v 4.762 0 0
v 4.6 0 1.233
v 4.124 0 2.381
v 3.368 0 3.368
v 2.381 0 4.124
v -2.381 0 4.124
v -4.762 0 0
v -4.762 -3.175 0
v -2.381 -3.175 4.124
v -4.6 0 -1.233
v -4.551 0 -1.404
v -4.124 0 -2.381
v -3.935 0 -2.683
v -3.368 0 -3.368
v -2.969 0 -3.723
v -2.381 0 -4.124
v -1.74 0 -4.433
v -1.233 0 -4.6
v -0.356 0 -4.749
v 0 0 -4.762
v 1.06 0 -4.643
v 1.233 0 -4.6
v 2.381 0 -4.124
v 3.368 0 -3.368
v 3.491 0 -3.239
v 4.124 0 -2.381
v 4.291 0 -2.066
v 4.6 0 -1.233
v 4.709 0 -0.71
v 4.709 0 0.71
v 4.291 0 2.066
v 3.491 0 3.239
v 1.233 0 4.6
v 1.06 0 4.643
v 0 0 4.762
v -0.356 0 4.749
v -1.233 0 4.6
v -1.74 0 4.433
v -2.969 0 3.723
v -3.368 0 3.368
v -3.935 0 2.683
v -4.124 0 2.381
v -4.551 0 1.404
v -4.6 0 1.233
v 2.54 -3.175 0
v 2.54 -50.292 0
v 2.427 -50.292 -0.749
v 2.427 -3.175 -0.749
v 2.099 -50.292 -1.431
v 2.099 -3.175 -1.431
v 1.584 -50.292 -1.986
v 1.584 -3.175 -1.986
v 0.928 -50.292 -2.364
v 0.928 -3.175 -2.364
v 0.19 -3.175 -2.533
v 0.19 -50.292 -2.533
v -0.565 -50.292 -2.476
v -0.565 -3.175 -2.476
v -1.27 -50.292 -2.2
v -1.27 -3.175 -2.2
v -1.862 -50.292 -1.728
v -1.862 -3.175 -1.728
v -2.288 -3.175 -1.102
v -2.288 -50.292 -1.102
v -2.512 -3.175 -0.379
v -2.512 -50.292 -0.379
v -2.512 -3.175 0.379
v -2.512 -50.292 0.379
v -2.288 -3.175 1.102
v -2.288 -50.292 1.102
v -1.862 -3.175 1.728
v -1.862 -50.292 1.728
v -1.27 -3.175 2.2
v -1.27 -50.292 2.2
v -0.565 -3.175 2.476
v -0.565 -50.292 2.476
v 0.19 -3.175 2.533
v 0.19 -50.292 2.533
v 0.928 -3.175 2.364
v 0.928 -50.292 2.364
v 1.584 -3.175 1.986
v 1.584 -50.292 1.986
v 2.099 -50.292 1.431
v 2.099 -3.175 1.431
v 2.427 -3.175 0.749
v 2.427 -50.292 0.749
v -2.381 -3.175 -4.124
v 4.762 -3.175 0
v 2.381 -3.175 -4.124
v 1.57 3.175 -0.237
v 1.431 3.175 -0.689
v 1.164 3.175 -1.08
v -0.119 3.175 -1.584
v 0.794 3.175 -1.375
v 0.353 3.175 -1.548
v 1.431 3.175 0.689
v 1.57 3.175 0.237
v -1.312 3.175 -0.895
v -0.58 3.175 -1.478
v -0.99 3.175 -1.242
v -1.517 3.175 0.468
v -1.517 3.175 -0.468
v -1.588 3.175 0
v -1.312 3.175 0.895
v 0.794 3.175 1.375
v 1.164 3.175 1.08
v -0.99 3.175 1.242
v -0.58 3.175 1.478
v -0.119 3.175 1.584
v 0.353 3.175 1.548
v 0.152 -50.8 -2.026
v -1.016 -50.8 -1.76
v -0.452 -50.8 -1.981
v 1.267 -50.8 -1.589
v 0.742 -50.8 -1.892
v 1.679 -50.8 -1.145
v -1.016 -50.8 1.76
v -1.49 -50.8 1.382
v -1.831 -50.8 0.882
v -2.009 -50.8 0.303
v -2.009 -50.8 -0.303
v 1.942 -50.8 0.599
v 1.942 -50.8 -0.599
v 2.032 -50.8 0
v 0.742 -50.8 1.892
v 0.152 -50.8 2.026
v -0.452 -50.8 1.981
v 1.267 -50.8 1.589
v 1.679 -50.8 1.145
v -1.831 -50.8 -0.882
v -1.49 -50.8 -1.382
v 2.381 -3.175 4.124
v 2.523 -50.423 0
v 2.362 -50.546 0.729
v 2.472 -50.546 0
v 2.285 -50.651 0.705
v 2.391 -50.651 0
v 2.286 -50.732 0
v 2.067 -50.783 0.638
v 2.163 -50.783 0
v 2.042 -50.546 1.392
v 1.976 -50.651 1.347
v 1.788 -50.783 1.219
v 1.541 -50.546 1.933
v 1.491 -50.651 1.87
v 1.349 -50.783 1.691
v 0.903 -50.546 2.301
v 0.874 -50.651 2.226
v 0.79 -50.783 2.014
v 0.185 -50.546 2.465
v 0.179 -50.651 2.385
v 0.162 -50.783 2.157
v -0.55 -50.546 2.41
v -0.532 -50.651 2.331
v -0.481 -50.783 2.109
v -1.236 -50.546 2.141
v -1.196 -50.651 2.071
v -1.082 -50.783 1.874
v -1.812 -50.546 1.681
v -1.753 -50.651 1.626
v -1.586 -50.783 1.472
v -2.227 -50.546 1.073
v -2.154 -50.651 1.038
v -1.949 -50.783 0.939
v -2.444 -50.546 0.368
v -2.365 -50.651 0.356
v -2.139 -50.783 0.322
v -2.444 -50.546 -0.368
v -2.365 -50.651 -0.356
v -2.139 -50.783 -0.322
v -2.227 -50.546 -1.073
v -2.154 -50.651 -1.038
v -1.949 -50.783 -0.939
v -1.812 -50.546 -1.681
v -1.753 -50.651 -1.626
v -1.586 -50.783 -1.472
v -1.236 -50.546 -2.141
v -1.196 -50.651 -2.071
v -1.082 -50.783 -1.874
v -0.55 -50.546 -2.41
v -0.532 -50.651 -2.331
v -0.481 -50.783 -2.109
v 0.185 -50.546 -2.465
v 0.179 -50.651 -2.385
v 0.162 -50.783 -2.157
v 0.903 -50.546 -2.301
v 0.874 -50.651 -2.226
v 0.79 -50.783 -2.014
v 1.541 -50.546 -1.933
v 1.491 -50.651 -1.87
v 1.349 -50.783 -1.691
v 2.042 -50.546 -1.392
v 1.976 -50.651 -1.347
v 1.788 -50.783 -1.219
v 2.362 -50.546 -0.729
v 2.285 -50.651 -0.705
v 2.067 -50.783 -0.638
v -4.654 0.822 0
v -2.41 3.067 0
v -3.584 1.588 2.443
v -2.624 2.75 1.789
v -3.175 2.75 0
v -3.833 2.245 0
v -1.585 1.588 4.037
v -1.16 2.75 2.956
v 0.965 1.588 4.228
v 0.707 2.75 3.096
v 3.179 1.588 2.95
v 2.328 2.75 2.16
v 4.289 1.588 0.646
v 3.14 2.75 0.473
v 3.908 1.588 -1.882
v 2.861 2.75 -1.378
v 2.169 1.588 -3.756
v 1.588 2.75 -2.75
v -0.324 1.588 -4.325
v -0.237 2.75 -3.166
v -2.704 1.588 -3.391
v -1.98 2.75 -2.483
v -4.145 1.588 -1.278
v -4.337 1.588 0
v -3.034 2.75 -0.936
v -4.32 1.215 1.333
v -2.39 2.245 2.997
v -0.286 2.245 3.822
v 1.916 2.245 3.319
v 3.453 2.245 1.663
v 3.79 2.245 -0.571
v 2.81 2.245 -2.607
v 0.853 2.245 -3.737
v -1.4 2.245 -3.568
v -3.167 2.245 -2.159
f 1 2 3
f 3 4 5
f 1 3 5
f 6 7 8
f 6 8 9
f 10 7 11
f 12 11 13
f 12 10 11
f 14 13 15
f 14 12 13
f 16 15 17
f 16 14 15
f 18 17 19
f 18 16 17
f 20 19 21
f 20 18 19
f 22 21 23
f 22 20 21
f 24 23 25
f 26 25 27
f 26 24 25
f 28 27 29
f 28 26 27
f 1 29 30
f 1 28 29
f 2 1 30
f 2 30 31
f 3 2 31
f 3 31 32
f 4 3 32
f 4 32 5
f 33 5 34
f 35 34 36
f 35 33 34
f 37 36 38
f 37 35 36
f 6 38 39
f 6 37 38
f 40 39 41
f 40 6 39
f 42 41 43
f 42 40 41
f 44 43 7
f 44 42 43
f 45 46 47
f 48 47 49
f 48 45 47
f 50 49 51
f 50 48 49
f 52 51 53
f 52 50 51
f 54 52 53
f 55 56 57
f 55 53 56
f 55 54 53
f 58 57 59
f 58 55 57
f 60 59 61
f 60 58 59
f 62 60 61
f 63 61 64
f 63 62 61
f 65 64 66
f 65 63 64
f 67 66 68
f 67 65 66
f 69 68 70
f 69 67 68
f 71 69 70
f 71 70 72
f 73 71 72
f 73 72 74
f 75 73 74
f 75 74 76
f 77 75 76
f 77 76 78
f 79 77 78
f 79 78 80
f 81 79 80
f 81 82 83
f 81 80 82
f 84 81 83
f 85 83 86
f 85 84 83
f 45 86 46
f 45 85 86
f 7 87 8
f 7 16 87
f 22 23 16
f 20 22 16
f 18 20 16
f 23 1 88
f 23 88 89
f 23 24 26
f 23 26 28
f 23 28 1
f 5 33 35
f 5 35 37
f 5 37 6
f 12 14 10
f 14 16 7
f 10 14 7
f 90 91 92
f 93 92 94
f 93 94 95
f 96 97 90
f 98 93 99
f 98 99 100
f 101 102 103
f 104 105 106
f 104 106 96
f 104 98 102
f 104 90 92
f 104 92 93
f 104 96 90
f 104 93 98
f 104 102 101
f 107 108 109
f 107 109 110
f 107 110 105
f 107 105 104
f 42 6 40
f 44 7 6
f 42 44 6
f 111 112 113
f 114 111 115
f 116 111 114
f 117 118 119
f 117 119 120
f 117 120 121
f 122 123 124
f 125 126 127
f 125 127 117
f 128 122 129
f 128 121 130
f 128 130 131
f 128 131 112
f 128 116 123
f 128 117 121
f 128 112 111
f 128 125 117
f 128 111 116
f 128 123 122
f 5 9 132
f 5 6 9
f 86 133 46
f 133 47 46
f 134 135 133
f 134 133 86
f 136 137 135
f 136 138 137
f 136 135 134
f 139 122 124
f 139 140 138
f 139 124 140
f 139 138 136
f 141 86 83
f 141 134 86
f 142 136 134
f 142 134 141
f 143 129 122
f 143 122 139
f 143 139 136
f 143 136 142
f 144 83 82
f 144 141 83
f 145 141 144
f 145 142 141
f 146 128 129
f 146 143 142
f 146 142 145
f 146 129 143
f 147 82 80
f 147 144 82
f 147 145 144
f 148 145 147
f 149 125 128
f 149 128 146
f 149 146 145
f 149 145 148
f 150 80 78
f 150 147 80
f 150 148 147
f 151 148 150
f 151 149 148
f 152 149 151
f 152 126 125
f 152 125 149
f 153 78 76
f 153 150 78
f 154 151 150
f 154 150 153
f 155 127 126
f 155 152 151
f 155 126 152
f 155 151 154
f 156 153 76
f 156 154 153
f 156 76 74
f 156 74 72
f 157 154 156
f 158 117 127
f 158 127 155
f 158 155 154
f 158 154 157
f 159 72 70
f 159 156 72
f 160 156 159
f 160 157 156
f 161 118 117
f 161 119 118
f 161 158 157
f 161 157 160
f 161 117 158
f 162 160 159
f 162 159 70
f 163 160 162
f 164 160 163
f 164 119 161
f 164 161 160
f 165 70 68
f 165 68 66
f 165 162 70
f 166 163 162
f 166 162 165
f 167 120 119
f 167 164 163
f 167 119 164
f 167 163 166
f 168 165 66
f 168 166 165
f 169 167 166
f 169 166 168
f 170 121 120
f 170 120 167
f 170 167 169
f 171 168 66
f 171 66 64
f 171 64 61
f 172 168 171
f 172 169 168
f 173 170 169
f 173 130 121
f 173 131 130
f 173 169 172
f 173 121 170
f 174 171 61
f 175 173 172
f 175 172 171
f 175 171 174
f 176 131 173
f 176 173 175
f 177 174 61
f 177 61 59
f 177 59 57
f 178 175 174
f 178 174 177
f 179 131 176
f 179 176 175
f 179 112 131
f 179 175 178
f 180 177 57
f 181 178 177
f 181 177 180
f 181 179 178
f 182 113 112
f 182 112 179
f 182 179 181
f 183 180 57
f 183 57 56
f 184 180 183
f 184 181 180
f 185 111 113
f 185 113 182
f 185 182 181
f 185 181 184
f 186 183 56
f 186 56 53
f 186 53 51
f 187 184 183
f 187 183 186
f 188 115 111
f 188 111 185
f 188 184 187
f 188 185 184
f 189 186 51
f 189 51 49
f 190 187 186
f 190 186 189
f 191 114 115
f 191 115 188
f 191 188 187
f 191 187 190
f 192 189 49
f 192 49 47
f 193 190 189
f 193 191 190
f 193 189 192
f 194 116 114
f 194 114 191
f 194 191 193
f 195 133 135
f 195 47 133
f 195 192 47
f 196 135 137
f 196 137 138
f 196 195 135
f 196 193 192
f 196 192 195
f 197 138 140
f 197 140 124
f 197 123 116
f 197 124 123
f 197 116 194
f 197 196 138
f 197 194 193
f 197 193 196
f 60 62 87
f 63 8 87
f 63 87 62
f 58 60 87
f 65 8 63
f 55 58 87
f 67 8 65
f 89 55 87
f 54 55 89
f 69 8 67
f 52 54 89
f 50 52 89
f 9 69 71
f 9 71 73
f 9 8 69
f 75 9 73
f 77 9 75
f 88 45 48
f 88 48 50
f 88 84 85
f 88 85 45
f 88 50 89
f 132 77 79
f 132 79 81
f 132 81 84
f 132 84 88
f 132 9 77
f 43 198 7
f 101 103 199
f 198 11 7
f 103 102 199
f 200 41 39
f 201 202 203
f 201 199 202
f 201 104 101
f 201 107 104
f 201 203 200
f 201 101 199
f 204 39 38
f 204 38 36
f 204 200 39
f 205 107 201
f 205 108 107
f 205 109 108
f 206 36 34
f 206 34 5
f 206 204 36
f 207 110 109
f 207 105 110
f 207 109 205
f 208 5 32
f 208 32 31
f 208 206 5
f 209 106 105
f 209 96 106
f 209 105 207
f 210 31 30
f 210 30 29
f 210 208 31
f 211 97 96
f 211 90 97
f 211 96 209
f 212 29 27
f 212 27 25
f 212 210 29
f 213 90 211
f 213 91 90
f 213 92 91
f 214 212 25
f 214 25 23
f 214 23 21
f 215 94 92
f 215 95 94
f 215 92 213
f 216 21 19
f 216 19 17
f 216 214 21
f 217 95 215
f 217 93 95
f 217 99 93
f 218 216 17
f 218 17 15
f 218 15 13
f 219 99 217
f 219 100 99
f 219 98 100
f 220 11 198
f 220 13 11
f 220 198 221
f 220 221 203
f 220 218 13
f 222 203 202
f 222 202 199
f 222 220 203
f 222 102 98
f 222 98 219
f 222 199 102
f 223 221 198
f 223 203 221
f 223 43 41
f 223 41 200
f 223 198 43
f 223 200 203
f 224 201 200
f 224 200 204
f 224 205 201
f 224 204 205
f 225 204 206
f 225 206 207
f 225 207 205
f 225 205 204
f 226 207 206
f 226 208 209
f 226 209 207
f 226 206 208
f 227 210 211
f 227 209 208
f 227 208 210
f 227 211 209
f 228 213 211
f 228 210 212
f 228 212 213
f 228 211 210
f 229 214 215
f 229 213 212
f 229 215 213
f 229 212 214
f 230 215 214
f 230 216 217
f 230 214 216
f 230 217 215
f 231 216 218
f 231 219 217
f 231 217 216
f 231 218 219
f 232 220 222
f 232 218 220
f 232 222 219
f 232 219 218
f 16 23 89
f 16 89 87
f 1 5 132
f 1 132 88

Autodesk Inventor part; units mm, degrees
ref_plane "YZ Plane" through (0, 0, 0) normal (1, 0, 0) x (0, 1, 0)
ref_plane "XZ Plane" through (0, 0, 0) normal (0, 1, 0) x (-1, 0, 0)
ref_plane "XY Plane" through (0, 0, 0) normal (0, 0, 1) x (1, 0, 0)
sketch "Sketch1" plane through (0, 0, 0) normal (0, 1, 0) x (-1, 0, 0)
  circle A0 centre (0, 0) radius 4.7625
  dimension "d0" = 9.525
extrude "Extrusion1" add sketch "Sketch1" along normal blind 3.175
fillet "Fillet1" radius 3.175 1 edges at (4.7625, 3.175, 0)
sketch "Sketch2" plane through (0, 0, 0) normal (0, -1, 0) x (1, 0, 0)
  circle A0 centre (0, 0) radius 2.54
  dimension "d4" = 5.08
extrude "Extrusion2" add sketch "Sketch2" along normal blind 50.8
fillet "Fillet2" radius 0.508 1 edges at (-2.54, -50.8, 0)
thread "Thread1" size "12-24 UNC" class "2A" standard "ANSI Unified Screw Threads" full length
sketch "Sketch3" plane through (0, 0, 0) normal (0, -1, 0) x (1, 0, 0)
  circle A0 centre (0, 0) radius 1.5875 projected
  circle A1 centre (0, 0) radius 4.7625 projected
  line L0 (-4.7625, 0) -> (-2.3813, 4.1244)
  line L1 (-2.3813, 4.1244) -> (2.3812, 4.1244)
  line L2 (2.3812, 4.1244) -> (4.7625, 0)
  line L3 (4.7625, 0) -> (2.3813, -4.1244)
  line L4 (2.3813, -4.1244) -> (-2.3812, -4.1244)
  line L5 (-2.3812, -4.1244) -> (-4.7625, 0)
extrude "Extrusion3" add sketch "Sketch3" along normal blind 3.175 contours L3 L4 L5 L0 L1 L2
properties part number "2in Bolt w Nut"
